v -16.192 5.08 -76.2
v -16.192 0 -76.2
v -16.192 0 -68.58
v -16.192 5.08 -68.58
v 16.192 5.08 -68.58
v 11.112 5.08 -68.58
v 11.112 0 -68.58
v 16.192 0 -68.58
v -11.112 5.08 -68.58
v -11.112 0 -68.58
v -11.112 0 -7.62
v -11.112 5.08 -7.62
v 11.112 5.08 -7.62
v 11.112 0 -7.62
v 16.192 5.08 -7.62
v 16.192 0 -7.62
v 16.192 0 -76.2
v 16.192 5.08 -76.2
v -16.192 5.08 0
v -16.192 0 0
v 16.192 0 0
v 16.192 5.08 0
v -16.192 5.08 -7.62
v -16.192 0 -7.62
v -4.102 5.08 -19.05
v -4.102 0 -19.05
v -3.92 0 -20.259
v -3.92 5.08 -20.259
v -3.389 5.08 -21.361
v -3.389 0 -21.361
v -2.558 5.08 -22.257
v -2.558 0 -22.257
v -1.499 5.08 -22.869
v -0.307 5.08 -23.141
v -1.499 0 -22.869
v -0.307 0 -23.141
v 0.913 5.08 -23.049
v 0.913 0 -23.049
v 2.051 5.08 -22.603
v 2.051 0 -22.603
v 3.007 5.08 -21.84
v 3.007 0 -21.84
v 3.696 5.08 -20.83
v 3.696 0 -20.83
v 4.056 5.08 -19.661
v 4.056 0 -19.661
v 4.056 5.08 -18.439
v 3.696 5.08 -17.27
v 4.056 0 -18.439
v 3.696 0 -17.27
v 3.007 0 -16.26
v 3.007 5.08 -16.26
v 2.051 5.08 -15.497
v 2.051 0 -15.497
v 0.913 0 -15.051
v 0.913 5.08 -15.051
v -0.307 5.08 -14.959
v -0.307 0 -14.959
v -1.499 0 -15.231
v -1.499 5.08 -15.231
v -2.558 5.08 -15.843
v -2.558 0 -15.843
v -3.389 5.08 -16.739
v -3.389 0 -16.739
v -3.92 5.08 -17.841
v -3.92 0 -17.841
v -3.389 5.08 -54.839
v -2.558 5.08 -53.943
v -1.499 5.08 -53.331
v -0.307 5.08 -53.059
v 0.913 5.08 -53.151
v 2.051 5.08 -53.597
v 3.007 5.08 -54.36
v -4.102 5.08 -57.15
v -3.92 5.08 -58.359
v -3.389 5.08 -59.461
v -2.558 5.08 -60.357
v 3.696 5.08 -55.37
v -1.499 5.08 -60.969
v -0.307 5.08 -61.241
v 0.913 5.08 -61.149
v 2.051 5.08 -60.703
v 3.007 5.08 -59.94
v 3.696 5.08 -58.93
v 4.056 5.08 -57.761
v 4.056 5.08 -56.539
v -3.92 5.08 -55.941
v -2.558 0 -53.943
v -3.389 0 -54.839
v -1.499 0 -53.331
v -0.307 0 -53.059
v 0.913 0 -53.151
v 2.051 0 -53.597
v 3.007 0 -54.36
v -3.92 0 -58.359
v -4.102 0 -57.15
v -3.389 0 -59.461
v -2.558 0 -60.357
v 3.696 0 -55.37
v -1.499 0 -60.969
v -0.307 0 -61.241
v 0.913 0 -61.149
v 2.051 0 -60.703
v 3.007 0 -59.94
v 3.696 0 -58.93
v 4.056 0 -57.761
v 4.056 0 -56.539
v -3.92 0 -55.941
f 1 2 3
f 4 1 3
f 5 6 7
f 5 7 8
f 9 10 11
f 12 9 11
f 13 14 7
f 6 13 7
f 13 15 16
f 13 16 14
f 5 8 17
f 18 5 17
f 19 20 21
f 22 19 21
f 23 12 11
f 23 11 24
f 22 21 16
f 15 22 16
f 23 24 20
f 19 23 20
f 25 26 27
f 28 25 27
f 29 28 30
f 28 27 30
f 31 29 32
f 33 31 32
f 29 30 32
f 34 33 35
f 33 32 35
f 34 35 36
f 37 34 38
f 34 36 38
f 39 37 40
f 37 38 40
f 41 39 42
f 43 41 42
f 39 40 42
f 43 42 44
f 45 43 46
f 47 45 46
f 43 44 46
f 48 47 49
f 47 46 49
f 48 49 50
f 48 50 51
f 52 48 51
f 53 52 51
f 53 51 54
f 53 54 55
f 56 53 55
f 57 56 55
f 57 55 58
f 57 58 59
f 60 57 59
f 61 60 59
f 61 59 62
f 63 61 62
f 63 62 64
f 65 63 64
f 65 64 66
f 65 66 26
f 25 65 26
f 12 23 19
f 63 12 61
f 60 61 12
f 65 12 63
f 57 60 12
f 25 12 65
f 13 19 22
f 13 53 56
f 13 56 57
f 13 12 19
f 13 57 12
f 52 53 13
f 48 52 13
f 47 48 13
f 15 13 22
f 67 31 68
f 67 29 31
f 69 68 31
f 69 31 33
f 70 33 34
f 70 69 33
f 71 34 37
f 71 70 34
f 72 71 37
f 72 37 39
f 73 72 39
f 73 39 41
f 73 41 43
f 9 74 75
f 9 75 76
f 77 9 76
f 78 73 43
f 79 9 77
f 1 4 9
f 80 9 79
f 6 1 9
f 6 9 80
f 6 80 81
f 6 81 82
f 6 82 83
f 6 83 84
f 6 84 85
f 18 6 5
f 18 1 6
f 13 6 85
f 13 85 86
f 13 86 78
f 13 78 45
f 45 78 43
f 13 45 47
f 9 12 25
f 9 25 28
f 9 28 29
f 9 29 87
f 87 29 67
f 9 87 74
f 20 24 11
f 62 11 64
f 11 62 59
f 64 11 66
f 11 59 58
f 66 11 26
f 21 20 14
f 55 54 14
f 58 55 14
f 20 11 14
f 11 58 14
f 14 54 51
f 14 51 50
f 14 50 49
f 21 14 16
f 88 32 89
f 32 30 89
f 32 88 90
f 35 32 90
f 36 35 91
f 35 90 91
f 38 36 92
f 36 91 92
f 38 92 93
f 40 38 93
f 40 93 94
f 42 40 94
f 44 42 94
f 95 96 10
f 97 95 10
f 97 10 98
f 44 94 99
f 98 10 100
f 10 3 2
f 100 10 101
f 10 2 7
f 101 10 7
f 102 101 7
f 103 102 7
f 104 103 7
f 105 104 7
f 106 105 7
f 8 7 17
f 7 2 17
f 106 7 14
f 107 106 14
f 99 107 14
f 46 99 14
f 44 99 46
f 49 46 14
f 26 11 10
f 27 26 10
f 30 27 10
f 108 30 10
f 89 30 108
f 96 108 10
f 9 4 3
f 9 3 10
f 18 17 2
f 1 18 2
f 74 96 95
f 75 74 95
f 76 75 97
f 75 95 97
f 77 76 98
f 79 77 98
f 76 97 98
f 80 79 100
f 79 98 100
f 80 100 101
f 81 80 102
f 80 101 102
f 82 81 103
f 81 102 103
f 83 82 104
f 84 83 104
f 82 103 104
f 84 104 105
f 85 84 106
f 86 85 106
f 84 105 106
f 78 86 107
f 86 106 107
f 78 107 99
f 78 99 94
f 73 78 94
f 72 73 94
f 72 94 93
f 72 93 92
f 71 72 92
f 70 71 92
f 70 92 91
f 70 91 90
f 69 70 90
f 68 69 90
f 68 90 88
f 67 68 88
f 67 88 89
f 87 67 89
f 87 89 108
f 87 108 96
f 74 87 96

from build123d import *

# Parameters (mm, degrees)
BOSS_EXTRUDE1_DEPTH          = 5.08
P_0_323_DIAMETER_HOLE1_D     = 8.2042
P_0_323_DIAMETER_HOLE1_DEPTH = 16.51
P_0_323_DIAMETER_HOLE1_TIP   = 2.464790345


with BuildPart() as part:
    # Sketch1 → Boss-Extrude1 (new body)
    with BuildSketch(Plane(origin=(0, 0, 0), x_dir=(1, 0, 0), z_dir=(0, 1, 0))):
        Polygon((-16.1925, 0), (16.1925, 0), (16.1925, 7.62), (11.1125, 7.62), (11.1125, 68.58), (16.1925, 68.58), (16.1925, 76.2), (-16.1925, 76.2), (-16.1925, 68.58), (-11.1125, 68.58), (-11.1125, 7.62), (-16.1925, 7.62), align=None)
    extrude(amount=BOSS_EXTRUDE1_DEPTH)

    # P (0.323) Diameter Hole1
    with Locations(Plane(origin=(0, 5.08, 0), x_dir=(1, 0, 0), z_dir=(0, 1, 0))):
        with Locations((0, 57.15), (0, 19.05)):
            Hole(P_0_323_DIAMETER_HOLE1_D / 2, depth=P_0_323_DIAMETER_HOLE1_DEPTH)
            with Locations((0, 0, -(P_0_323_DIAMETER_HOLE1_DEPTH + P_0_323_DIAMETER_HOLE1_TIP / 2))):  # 118° drill point
                Cone(0, P_0_323_DIAMETER_HOLE1_D / 2, P_0_323_DIAMETER_HOLE1_TIP, mode=Mode.SUBTRACT)


solid = part.part
